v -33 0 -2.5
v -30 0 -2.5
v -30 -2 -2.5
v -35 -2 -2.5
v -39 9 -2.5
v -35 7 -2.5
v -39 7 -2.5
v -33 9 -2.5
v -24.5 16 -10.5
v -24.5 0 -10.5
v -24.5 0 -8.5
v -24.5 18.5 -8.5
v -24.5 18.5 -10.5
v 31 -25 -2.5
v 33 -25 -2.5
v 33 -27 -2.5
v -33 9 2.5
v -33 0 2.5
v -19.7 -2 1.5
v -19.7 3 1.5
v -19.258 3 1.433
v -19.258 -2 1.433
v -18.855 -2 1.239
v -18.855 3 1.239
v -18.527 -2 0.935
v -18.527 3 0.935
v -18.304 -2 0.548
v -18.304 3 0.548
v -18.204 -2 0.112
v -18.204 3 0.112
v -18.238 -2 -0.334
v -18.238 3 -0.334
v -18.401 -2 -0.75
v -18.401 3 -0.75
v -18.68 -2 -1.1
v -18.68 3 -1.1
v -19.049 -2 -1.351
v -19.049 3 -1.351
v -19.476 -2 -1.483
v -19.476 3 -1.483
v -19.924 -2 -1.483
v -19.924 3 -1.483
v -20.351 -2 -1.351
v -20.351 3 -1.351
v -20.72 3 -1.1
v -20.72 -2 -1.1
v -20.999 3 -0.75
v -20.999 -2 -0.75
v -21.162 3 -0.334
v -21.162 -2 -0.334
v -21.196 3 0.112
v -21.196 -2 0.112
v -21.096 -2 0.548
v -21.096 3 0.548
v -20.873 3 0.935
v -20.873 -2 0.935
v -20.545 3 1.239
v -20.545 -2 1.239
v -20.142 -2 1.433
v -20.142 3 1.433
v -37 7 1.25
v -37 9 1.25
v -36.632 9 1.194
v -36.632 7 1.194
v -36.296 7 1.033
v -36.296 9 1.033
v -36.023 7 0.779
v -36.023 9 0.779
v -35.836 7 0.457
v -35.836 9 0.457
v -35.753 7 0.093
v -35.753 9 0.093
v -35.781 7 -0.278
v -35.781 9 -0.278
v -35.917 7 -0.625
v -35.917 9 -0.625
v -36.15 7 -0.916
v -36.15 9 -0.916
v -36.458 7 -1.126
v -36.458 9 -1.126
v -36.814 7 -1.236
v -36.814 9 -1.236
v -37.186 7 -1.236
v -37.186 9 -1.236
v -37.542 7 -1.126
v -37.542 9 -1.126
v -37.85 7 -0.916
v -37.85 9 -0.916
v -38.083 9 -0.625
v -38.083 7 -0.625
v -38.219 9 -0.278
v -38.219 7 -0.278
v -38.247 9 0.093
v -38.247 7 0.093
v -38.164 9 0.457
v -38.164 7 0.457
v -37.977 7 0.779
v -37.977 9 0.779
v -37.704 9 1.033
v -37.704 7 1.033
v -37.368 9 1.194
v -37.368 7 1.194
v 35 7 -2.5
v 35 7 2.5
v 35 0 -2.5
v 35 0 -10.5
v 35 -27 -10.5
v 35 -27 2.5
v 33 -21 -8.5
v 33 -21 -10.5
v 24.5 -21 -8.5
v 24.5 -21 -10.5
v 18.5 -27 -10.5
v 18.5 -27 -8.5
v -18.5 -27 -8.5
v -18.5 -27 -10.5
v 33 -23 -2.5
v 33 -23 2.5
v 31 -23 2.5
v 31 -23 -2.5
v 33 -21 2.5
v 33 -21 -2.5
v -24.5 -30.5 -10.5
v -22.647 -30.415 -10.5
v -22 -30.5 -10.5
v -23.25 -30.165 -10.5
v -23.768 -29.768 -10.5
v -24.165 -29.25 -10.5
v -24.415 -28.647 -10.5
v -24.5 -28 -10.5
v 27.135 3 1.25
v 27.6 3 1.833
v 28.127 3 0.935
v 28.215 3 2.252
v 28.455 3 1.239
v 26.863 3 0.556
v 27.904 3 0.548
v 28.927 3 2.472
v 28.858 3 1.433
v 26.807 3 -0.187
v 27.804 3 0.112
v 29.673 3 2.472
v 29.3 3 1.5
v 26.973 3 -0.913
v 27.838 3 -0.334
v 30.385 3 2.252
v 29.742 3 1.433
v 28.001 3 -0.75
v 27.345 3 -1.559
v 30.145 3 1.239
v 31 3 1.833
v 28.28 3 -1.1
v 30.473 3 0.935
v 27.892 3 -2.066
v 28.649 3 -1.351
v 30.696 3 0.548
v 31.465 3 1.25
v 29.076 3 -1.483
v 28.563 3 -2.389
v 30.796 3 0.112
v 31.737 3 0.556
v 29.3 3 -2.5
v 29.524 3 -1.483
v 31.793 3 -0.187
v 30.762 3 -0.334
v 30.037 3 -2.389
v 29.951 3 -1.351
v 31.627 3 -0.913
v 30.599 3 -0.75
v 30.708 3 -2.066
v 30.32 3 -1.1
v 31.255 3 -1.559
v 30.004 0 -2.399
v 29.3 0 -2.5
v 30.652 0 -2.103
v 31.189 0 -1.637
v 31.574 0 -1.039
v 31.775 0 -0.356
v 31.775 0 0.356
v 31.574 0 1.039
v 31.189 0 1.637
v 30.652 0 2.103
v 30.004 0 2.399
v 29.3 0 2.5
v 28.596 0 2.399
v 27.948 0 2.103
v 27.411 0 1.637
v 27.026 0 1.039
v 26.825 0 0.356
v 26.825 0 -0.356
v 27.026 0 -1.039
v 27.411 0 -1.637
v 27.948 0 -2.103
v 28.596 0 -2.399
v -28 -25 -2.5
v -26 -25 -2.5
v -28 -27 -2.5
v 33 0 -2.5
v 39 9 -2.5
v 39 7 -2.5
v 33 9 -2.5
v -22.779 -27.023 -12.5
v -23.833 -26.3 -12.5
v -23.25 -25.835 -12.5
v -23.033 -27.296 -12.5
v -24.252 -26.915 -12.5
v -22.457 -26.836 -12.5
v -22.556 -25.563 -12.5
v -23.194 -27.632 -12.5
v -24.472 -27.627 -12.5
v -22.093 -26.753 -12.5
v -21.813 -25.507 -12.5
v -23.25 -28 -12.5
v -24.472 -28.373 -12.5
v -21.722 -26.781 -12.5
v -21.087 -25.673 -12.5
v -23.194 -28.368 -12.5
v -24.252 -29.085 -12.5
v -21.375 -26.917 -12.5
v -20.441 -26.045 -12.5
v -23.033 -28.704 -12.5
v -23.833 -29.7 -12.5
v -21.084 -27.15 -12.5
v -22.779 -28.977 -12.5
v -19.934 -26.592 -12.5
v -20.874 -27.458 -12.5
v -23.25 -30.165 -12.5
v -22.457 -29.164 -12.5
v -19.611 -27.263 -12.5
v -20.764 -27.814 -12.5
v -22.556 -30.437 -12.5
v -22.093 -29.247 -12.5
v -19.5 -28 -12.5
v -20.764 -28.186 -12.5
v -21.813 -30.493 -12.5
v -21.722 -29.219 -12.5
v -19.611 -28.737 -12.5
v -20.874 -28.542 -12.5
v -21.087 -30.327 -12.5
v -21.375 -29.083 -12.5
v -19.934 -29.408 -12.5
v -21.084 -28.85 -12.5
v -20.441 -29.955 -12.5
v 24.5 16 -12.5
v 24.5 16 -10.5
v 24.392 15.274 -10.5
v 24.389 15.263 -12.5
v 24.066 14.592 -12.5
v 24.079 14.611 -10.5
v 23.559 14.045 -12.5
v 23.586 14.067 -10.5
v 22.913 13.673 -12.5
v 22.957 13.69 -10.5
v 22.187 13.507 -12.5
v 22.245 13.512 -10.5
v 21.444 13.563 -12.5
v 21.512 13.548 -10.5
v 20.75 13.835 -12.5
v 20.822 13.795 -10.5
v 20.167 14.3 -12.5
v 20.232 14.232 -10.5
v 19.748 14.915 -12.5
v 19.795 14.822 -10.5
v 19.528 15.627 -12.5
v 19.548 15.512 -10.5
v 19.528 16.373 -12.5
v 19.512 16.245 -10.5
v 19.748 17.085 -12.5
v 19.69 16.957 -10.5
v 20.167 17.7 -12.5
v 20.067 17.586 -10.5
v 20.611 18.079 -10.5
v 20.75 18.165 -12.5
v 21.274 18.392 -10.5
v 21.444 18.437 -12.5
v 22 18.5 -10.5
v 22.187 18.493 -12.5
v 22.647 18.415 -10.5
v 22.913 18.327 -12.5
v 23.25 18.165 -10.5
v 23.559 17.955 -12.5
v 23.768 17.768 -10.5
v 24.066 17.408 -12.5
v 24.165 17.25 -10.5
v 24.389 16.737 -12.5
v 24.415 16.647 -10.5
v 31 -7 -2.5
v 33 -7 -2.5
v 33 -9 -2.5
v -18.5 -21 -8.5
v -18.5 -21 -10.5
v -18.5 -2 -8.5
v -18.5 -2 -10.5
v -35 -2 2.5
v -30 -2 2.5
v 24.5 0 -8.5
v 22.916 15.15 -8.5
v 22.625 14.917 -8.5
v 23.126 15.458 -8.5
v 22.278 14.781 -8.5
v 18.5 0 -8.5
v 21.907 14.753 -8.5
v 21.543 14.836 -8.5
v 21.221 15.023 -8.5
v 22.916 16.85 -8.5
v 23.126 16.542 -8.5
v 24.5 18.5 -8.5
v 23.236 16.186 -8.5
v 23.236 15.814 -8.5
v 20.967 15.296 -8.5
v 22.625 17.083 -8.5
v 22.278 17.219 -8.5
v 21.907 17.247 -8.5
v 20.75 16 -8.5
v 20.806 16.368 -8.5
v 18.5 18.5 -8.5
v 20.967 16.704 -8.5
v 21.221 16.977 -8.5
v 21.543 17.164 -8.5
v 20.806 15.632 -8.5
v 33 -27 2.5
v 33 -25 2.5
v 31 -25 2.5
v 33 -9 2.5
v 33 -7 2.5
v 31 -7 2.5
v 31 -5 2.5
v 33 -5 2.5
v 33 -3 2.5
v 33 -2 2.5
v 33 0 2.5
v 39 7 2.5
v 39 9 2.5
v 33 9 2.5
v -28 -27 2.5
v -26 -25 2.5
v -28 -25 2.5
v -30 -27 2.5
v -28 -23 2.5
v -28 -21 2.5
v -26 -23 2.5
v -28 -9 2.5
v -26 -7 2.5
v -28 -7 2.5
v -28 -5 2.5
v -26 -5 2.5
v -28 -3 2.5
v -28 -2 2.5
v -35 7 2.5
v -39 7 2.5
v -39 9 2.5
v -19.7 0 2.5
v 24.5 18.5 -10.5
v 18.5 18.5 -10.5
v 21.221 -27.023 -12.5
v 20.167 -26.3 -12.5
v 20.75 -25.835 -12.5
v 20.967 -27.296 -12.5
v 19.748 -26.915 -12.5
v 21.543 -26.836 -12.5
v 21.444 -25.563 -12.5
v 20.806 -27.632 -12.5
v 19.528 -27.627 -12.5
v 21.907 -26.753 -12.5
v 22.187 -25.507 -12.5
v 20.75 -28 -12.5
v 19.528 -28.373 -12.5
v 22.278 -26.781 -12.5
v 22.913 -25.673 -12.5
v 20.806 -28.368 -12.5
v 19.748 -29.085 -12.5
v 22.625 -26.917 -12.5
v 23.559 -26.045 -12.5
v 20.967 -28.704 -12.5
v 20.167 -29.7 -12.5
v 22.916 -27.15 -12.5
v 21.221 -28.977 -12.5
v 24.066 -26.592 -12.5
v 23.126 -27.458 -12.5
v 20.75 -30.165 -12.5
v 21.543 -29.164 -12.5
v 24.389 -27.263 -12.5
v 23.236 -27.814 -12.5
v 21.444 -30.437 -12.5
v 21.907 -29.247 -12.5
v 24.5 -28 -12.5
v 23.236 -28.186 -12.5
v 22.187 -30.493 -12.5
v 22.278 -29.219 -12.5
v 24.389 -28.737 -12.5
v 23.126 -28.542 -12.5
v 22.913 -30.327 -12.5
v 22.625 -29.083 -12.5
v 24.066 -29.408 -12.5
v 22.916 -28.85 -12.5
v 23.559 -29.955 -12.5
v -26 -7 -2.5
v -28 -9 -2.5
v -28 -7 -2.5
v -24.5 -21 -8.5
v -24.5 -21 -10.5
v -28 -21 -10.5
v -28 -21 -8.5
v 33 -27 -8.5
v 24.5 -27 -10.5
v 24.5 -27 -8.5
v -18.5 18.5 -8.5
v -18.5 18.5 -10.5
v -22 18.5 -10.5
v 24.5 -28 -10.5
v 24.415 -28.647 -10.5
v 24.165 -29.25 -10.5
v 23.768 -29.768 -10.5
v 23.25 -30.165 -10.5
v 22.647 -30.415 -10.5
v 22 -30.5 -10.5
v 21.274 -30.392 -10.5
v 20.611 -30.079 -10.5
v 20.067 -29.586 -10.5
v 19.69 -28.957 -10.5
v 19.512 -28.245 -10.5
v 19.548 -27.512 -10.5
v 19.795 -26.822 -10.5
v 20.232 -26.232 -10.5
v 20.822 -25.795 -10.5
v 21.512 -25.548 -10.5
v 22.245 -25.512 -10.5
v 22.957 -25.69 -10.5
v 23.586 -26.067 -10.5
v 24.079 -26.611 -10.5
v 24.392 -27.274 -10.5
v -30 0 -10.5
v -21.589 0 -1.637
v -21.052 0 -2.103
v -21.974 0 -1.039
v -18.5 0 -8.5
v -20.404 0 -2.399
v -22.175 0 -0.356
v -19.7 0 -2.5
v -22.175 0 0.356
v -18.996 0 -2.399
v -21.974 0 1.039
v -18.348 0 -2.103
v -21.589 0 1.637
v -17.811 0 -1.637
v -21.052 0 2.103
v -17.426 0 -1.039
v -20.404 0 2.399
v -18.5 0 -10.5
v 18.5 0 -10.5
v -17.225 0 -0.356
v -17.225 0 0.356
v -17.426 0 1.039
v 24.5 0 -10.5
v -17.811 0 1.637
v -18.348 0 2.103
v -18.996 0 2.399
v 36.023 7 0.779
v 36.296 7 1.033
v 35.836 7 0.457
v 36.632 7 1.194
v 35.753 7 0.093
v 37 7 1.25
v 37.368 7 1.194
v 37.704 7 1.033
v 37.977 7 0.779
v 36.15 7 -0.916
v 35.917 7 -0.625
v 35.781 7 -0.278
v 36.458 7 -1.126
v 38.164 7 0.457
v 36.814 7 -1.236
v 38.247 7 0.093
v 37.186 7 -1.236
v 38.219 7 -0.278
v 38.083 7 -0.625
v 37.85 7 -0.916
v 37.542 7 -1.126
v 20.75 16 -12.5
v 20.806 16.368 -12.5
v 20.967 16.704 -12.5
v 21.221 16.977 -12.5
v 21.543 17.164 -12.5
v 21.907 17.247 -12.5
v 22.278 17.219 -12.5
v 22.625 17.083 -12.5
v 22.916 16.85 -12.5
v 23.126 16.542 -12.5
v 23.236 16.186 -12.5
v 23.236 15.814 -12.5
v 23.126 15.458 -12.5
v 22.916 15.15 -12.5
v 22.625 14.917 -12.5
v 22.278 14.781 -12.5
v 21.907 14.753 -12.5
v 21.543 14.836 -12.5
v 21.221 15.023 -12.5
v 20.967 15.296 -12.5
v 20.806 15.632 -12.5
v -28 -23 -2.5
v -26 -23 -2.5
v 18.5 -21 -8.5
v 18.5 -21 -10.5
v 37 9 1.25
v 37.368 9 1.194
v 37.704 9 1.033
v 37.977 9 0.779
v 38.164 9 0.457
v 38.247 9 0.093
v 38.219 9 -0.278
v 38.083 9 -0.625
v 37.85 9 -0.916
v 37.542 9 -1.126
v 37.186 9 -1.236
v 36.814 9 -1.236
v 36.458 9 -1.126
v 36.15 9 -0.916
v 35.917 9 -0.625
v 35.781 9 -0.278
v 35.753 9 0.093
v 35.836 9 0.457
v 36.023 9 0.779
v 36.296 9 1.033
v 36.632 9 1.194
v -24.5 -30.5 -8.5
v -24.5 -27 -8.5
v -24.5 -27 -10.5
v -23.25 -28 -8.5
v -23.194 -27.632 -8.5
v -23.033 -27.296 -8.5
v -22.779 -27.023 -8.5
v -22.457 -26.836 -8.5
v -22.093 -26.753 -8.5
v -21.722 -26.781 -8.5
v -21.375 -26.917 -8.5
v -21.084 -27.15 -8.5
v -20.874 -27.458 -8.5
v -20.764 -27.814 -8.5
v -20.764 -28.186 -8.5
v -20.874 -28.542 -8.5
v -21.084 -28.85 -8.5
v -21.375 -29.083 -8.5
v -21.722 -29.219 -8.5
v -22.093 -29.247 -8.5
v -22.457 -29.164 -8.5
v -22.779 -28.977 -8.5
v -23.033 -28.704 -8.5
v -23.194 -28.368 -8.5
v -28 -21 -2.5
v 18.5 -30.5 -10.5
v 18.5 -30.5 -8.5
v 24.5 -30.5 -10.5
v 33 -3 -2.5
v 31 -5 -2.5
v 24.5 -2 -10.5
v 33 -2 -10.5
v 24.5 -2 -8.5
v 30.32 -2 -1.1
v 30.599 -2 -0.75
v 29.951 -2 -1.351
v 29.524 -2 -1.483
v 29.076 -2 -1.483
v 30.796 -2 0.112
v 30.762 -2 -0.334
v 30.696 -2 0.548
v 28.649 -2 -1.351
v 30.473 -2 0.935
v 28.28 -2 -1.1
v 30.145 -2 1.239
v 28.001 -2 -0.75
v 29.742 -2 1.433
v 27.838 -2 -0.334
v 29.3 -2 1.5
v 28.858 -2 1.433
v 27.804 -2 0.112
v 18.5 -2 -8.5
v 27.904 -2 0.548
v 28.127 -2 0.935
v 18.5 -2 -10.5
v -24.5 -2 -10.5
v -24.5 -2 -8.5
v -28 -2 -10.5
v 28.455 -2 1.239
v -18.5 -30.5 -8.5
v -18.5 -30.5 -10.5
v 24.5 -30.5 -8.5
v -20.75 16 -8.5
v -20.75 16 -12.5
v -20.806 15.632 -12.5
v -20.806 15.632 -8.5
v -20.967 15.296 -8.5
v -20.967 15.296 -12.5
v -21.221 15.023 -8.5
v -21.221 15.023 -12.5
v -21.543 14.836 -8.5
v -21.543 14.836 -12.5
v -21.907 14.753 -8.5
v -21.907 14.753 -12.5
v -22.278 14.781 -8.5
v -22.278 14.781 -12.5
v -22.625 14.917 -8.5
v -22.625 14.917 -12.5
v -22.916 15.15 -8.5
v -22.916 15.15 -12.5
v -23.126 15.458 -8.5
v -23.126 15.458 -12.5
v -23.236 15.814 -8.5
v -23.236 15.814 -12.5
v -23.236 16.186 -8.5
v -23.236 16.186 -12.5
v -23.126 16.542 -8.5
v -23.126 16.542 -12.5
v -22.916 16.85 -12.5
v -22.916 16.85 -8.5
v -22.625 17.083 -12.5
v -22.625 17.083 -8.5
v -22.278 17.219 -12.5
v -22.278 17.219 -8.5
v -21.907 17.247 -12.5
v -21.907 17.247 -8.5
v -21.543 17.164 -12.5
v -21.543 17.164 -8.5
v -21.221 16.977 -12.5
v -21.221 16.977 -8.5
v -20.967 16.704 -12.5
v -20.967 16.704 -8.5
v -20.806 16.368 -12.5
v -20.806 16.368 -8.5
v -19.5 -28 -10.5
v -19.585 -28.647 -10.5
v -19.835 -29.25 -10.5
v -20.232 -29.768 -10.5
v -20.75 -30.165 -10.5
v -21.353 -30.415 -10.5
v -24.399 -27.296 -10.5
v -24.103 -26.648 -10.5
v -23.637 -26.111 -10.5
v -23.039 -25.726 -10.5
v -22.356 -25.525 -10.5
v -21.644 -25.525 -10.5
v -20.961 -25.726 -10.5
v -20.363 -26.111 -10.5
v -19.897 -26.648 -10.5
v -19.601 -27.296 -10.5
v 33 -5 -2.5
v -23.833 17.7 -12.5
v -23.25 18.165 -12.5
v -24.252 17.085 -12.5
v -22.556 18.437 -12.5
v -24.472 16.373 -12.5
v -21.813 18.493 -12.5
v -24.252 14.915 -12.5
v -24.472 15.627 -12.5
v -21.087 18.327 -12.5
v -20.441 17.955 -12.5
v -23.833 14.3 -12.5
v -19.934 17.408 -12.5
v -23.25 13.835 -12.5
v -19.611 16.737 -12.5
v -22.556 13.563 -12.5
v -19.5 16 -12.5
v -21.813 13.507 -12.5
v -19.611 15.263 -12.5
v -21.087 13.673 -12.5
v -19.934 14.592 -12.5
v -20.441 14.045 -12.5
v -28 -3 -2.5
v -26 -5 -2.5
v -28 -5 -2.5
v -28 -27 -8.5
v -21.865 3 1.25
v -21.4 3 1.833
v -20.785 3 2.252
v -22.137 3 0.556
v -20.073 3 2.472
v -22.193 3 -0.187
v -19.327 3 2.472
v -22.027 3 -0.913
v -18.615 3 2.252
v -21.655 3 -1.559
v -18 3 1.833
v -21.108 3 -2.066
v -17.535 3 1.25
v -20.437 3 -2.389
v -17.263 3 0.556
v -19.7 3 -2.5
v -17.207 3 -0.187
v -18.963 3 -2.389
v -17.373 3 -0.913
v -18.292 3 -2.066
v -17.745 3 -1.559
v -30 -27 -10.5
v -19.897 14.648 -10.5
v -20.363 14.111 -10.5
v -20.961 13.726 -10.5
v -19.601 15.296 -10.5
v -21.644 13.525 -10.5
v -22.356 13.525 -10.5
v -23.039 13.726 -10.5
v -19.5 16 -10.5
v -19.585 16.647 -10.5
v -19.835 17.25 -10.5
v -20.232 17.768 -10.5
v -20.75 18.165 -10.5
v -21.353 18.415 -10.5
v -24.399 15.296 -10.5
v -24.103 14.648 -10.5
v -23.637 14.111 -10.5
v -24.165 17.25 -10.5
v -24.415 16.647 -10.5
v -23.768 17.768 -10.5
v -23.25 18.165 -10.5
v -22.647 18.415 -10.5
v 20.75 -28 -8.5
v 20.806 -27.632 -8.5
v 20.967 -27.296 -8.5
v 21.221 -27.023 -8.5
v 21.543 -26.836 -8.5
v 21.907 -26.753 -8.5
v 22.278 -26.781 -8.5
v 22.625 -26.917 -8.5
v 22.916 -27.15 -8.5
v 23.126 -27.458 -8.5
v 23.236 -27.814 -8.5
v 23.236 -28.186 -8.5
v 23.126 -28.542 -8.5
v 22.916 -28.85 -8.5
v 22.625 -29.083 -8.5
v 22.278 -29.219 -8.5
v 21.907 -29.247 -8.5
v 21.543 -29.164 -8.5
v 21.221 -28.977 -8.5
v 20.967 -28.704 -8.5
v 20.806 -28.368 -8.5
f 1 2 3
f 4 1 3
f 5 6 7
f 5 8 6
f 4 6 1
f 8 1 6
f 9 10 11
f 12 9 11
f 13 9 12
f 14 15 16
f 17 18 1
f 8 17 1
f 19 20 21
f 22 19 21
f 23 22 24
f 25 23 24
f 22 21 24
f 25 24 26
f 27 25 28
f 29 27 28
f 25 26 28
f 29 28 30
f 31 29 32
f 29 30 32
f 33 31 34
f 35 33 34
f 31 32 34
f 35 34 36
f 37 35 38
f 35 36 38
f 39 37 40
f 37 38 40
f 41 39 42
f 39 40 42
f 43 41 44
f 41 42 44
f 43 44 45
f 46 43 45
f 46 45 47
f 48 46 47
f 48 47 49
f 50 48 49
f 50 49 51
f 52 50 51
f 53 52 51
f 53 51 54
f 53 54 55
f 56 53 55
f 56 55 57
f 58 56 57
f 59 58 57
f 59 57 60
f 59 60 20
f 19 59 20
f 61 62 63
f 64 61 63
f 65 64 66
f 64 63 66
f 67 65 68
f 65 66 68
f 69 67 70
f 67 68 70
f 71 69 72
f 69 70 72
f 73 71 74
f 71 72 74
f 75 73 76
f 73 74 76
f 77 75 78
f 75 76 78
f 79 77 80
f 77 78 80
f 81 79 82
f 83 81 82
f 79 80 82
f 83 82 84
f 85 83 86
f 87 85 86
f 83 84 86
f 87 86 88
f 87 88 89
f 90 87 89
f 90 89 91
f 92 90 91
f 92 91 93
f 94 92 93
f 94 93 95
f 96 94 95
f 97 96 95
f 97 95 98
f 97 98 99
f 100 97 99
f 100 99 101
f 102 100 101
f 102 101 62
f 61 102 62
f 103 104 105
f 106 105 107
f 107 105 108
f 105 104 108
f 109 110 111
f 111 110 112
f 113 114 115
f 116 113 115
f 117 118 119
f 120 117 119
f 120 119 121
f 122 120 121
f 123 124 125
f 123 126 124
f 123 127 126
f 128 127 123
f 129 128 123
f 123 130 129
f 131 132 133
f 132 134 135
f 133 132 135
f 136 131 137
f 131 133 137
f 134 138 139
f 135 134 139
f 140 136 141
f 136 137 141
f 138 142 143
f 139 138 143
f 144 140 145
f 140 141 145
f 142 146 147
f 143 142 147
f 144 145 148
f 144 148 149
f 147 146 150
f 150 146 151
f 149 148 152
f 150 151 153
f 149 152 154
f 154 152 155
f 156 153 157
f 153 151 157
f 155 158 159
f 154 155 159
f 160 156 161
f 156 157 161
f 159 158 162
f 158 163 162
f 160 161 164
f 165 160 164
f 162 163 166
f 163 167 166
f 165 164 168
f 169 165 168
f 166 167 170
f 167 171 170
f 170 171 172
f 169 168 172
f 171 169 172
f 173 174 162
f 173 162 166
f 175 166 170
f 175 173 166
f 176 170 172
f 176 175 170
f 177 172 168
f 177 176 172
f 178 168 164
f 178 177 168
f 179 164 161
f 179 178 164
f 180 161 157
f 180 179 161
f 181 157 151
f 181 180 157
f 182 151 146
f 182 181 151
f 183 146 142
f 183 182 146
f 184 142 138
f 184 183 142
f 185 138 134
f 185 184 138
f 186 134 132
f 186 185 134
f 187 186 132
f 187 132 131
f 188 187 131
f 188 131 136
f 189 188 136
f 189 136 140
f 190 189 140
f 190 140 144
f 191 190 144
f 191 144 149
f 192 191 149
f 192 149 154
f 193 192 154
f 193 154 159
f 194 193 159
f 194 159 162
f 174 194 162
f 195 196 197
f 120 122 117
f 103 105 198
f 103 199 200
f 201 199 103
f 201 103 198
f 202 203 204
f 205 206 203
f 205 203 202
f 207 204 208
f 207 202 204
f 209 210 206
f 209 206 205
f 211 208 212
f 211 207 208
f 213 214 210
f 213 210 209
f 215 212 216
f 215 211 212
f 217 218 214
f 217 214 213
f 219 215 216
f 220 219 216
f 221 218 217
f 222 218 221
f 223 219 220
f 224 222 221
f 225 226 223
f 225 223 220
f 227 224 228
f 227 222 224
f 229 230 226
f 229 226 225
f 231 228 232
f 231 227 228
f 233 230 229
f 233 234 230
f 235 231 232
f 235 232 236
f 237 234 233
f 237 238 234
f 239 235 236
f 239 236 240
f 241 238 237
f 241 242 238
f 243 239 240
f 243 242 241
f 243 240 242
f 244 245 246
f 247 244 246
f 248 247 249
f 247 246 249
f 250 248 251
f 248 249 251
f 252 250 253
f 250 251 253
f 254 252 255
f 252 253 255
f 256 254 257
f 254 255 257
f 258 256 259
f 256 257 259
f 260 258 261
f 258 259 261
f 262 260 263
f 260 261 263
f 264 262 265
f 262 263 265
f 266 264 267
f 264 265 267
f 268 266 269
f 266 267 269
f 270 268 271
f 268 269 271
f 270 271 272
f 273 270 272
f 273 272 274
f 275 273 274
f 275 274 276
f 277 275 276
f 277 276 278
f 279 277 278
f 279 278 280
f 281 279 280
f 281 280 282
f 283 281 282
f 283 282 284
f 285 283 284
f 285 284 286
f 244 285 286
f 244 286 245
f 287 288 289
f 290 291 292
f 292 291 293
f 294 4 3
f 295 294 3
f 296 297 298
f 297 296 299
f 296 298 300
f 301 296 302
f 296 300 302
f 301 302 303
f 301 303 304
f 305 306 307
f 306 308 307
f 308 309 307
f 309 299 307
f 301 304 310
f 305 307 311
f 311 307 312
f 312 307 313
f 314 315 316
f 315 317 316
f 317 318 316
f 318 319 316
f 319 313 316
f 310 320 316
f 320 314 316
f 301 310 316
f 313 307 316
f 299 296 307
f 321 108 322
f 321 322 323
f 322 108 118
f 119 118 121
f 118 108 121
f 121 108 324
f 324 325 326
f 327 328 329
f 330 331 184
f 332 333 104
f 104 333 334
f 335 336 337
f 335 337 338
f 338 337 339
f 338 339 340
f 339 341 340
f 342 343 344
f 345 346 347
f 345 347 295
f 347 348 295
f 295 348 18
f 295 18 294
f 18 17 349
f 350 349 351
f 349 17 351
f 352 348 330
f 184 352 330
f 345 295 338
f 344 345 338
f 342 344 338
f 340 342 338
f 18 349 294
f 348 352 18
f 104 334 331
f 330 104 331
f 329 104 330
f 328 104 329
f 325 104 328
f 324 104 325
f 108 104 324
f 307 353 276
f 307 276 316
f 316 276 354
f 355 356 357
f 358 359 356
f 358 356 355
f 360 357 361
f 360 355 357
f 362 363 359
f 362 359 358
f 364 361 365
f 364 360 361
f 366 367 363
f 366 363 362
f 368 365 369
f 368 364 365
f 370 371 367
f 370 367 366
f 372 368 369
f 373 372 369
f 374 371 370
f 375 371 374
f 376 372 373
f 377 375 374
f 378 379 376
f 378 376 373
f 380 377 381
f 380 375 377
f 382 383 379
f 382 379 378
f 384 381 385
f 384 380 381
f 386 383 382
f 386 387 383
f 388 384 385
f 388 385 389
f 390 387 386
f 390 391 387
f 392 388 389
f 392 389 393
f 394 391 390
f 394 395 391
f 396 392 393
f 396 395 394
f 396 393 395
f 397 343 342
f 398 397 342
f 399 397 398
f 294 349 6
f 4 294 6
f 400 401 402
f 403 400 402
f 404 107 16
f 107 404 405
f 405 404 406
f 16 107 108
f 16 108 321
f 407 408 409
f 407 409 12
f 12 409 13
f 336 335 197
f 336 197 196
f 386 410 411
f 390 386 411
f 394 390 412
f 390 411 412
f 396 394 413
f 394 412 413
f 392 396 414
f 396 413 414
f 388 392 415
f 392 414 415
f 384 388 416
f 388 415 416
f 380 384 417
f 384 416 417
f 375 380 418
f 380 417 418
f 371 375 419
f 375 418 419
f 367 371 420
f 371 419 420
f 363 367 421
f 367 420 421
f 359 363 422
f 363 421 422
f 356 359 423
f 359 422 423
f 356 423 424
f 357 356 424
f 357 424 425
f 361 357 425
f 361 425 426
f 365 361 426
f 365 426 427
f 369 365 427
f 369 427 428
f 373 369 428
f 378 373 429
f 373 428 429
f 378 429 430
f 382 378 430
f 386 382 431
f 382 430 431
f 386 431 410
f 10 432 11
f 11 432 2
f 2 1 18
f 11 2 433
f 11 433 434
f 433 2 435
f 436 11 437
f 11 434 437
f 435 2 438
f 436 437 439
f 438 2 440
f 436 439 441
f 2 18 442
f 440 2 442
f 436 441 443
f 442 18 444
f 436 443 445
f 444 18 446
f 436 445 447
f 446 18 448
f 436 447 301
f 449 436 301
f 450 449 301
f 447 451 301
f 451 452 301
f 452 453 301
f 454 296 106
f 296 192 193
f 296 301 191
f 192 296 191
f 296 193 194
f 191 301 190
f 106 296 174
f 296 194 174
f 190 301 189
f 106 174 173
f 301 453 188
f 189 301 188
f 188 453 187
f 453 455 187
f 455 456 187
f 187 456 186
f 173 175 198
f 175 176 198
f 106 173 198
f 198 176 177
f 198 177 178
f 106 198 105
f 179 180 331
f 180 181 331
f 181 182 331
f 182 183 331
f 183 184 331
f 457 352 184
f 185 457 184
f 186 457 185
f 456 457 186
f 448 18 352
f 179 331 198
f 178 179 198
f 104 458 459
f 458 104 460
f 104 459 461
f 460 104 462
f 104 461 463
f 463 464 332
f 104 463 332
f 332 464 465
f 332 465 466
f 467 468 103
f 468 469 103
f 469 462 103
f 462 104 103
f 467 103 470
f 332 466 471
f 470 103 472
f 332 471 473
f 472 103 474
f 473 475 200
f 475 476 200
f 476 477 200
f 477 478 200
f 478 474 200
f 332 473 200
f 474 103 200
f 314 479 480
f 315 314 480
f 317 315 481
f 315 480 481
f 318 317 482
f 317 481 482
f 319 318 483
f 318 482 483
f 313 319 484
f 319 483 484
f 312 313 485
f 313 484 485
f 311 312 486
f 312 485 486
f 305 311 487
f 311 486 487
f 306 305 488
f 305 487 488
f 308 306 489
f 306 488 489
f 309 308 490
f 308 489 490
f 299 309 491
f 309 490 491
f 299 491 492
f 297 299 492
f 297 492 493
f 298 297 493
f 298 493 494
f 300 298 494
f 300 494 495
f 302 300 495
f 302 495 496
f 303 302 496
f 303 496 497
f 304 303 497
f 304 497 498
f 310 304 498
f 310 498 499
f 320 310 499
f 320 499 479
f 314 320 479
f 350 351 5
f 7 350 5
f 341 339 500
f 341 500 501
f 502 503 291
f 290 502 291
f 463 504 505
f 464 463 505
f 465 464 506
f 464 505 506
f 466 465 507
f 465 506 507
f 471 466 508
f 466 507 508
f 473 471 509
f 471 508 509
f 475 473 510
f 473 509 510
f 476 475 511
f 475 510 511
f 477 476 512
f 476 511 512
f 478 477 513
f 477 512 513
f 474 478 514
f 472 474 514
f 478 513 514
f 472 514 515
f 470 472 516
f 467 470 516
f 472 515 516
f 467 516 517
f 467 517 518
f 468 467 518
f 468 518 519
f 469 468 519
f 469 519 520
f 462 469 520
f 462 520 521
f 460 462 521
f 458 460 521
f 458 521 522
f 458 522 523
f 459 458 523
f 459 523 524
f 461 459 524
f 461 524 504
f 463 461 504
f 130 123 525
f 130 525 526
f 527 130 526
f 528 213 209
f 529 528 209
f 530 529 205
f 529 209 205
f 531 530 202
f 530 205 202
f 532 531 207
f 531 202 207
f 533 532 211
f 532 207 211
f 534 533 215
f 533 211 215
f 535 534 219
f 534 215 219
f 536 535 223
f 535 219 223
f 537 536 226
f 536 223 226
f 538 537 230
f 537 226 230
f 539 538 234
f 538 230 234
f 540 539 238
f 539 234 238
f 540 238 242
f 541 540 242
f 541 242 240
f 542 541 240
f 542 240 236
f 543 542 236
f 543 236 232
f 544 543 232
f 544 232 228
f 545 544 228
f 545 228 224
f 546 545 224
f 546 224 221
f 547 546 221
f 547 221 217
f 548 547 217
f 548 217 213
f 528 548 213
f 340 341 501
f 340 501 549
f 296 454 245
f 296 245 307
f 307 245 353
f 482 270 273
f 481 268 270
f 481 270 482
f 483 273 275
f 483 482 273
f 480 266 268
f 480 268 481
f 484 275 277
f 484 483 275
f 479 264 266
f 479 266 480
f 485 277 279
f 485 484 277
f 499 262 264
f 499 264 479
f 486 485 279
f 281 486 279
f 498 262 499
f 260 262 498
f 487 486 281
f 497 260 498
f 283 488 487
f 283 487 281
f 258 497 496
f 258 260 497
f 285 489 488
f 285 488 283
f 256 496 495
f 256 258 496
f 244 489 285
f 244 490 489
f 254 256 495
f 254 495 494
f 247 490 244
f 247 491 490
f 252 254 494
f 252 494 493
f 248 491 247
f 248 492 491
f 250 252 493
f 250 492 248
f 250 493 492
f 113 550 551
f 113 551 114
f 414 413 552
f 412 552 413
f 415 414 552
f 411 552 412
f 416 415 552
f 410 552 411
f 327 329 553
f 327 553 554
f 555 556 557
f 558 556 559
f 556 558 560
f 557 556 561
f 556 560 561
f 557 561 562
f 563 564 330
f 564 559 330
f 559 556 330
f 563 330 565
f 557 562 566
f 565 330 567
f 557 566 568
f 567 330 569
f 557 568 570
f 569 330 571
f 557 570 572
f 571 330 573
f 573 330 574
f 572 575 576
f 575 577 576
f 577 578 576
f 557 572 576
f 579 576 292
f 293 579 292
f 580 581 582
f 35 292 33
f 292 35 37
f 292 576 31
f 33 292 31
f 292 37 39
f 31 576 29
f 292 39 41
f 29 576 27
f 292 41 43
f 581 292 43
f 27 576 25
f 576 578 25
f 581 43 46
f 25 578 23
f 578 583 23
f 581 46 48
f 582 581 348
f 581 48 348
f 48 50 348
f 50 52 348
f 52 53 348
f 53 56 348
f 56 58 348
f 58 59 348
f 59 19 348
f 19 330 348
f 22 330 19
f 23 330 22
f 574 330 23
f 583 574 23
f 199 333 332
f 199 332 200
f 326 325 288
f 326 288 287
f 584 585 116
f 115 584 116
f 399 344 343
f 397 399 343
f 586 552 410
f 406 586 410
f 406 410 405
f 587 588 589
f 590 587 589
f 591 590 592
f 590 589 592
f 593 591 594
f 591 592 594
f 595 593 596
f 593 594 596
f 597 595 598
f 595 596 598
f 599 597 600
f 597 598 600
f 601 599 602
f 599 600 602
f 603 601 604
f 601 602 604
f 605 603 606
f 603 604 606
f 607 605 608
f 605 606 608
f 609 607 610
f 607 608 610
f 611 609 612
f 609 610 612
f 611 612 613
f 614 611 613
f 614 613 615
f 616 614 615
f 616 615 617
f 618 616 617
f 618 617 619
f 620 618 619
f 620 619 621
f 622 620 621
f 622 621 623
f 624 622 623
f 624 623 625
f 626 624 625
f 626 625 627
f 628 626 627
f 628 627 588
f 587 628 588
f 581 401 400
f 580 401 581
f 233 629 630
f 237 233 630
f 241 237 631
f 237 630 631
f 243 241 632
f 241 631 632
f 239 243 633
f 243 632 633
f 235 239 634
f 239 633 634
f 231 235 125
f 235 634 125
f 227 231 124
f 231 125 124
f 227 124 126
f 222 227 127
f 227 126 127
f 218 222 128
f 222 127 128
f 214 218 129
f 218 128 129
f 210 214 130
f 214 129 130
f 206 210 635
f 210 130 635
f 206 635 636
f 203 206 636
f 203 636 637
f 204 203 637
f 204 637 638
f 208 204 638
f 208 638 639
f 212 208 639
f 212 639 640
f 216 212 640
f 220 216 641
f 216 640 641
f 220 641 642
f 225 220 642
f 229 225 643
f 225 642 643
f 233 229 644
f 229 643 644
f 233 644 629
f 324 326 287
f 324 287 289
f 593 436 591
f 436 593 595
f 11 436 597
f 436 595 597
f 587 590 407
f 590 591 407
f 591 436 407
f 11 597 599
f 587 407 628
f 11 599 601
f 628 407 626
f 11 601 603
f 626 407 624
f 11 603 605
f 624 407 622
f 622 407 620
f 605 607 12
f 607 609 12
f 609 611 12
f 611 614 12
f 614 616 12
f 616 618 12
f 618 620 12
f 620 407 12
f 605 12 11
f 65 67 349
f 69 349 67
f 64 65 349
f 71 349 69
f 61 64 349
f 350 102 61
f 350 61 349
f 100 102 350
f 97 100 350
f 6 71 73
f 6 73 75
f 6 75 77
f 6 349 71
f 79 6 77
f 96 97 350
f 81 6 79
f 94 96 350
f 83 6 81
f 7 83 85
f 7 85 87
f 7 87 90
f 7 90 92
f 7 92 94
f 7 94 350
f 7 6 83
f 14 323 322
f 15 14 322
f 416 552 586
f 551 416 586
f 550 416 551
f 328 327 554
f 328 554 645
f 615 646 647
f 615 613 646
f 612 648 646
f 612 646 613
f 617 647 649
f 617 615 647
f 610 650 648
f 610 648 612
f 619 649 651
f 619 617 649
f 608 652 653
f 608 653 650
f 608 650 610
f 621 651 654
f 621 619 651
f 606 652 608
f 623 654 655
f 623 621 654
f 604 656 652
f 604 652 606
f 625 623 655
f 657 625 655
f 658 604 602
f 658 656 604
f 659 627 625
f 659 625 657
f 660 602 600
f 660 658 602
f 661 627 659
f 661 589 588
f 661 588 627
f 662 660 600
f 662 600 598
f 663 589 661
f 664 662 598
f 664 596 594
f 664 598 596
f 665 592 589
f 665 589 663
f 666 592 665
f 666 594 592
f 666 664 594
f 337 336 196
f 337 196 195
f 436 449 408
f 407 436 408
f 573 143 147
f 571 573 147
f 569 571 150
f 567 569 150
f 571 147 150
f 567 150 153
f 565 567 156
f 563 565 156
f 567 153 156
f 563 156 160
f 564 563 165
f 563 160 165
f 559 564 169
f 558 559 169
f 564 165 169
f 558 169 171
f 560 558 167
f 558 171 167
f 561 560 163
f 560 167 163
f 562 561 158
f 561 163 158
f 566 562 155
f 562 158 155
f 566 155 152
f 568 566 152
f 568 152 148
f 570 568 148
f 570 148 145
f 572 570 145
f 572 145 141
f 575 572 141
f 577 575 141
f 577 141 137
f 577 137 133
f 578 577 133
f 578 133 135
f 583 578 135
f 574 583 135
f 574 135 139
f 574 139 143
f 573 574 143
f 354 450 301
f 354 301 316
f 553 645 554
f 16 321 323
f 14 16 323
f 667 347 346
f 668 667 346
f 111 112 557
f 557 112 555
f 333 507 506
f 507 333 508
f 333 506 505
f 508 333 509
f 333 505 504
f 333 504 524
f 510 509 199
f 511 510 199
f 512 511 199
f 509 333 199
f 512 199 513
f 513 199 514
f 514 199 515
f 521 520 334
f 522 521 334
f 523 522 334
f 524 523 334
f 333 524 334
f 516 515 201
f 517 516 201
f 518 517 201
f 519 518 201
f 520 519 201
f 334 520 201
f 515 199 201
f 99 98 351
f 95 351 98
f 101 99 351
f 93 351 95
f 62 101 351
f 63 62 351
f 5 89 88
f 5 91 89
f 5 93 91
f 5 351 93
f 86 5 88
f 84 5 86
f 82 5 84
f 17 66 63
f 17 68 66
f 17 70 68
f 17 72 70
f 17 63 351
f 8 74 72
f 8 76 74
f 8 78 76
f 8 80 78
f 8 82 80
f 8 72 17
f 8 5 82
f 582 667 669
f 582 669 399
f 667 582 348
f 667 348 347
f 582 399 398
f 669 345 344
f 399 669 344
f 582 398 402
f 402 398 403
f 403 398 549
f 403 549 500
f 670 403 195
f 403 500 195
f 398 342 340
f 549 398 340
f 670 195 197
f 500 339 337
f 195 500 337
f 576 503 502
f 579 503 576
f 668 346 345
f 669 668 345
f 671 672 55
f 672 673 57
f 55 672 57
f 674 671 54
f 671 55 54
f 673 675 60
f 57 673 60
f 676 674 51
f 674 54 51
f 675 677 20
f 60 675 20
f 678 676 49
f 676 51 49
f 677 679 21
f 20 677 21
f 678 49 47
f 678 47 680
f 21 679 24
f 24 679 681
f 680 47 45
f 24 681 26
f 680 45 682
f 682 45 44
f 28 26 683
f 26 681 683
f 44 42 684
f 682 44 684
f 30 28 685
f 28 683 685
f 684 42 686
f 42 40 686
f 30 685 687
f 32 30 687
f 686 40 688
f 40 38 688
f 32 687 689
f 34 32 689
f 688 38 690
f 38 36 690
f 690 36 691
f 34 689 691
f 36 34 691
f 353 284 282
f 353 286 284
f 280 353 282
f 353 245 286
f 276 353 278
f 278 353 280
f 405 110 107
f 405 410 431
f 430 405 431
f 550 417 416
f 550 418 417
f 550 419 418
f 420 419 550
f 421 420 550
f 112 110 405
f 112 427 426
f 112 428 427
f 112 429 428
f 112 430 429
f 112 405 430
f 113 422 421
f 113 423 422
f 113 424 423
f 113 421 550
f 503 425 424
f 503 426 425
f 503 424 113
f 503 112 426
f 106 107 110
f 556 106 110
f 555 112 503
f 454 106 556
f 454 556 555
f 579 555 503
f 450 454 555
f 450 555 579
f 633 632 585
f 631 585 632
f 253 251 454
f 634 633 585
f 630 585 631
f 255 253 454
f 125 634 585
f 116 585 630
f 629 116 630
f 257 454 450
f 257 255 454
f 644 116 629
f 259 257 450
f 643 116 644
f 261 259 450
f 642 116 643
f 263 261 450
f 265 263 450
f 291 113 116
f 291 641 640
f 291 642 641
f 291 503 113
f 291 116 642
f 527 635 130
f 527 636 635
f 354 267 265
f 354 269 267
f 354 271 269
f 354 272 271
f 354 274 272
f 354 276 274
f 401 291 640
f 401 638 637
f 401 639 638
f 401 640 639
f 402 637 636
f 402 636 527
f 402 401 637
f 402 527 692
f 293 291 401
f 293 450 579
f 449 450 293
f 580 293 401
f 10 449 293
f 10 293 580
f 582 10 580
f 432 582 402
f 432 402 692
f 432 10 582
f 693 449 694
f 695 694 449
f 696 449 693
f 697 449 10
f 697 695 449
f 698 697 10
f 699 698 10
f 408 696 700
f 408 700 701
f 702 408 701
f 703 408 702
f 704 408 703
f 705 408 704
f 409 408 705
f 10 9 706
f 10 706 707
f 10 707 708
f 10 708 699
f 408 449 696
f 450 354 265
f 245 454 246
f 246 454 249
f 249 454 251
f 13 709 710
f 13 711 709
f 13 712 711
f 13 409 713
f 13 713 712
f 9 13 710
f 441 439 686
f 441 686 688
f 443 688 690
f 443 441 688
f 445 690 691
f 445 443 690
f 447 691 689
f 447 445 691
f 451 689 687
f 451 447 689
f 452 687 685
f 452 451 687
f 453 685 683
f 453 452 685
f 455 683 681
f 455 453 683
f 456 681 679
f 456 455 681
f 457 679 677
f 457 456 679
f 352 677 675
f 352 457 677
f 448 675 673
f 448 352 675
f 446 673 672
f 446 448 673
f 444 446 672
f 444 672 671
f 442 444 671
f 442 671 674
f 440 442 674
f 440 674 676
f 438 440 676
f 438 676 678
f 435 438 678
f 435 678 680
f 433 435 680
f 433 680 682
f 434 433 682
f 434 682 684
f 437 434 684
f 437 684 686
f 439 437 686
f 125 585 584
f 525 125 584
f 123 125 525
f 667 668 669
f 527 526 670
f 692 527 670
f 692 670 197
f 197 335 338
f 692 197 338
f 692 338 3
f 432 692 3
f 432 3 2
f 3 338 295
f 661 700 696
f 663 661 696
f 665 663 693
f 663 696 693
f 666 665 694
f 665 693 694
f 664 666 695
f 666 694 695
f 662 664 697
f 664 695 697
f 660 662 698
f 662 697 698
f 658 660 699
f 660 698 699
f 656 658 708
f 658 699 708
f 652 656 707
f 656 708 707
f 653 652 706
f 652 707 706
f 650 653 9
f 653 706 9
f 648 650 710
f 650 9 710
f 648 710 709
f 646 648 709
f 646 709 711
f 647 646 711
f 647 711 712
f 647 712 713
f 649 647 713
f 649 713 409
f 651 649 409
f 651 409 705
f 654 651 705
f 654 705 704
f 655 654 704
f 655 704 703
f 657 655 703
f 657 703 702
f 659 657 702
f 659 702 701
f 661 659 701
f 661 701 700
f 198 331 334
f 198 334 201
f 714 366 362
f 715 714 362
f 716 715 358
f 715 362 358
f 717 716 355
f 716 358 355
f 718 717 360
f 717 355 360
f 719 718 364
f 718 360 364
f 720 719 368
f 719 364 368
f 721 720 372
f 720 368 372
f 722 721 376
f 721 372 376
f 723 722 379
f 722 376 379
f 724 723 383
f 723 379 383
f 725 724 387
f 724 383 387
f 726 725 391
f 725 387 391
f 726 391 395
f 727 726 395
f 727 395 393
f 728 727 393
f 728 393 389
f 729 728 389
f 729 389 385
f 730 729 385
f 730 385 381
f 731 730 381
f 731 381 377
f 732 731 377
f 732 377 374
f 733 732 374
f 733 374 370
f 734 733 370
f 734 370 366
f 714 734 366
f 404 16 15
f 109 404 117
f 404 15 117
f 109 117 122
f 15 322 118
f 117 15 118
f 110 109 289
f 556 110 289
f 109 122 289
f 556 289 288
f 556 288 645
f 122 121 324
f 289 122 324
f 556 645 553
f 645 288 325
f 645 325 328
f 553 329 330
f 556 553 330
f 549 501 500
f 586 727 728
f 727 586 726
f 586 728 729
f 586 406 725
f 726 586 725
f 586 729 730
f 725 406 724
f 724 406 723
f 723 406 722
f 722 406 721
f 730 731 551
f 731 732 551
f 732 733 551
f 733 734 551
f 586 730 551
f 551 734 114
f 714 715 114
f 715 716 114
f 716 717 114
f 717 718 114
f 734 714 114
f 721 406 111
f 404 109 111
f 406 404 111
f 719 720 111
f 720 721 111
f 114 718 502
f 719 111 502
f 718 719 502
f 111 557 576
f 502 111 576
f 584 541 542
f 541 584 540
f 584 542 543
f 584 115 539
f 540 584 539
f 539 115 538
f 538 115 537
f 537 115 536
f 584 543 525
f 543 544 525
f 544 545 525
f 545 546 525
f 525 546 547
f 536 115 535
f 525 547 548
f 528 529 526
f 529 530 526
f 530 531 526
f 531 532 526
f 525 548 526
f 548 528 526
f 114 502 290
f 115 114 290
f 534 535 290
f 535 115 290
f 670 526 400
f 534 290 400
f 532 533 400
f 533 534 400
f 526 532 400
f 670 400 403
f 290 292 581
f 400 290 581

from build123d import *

# Parameters (mm, degrees)
SKETCH1_W           = 66
SKETCH1_H           = 5
BASE_FLANGE1_DEPTH  = 2
SKETCH2_R           = 2.5
BOSS_EXTRUDE1_DEPTH = 3
SKETCH3_W           = 2
SKETCH3_H           = 5
BOSS_EXTRUDE2_DEPTH = 11
SKETCH4_W           = 6
SKETCH4_H           = 5
BOSS_EXTRUDE3_DEPTH = 2
SKETCH5_R           = 1.5
CUT_EXTRUDE1_DEPTH  = 40.537956447
SKETCH6_R           = 1.25
CUT_EXTRUDE2_DEPTH  = 41.598645298
SKETCH7_W           = 2
SKETCH7_H           = 5
BOSS_EXTRUDE4_DEPTH = 25
BOSS_EXTRUDE5_DEPTH = 5
BOSS_EXTRUDE6_DEPTH = 8
SKETCH13_W          = 65
SKETCH13_H          = 6
BOSS_EXTRUDE8_DEPTH = 2
SKETCH12_W          = 6
SKETCH12_H          = 49
BOSS_EXTRUDE7_DEPTH = 2
SKETCH14_R          = 2.5
BOSS_EXTRUDE9_DEPTH = 2
CUT_EXTRUDE3_REACH  = 53.732
SKETCH15_R          = 1.25


# Sheet-metal steps are written as plain solids
with BuildPart() as part:
    # Sketch1 → Base-Flange1 (new body)
    with BuildSketch(Plane(origin=(0, 0, 0), x_dir=(1, 0, 0), z_dir=(0, 1, 0))):
        Rectangle(SKETCH1_W, SKETCH1_H)
    extrude(amount=-BASE_FLANGE1_DEPTH)

    # Sketch2 → Boss-Extrude1 (add)
    with BuildSketch(Plane(origin=(0, 0, 0), x_dir=(-1, 0, 0), z_dir=(0, -1, 0))):
        with Locations(Location((19.7, 0, 0), (0, 0, 90))):
            Circle(SKETCH2_R)
        with Locations(Location((-29.3, 0, 0), (0, 0, 90))):
            Circle(SKETCH2_R)
    extrude(amount=-BOSS_EXTRUDE1_DEPTH)

    # Sketch3 → Boss-Extrude2 (add)
    with BuildSketch(Plane(origin=(0, -2, 0), x_dir=(-1, 0, 0), z_dir=(0, -1, 0))):
        with Locations((-34, 0)):
            Rectangle(SKETCH3_W, SKETCH3_H)
    boss_extrude2 = extrude(amount=-BOSS_EXTRUDE2_DEPTH)

    # Sketch4 → Boss-Extrude3 (add)
    with BuildSketch(Plane(origin=(0, 9, 0), x_dir=(1, 0, 0), z_dir=(0, 1, 0))):
        with Locations((36, 0)):
            Rectangle(SKETCH4_W, SKETCH4_H)
    boss_extrude3 = extrude(amount=-BOSS_EXTRUDE3_DEPTH)

    # Mirror1: Boss-Extrude2, Boss-Extrude3 across plane
    add(boss_extrude2.mirror(Plane(origin=(0, 0, 0), x_dir=(0, 0, 1), z_dir=(1, 0, 0))))
    add(boss_extrude3.mirror(Plane(origin=(0, 0, 0), x_dir=(0, 0, 1), z_dir=(1, 0, 0))))

    # Sketch5 → Cut-Extrude1 (cut, through all)
    with BuildSketch(Plane(origin=(0, 3, 0), x_dir=(1, 0, 0), z_dir=(0, 1, 0))):
        with Locations(Location((-19.7, 0, 0), (0, 0, 270))):
            Circle(SKETCH5_R)
        with Locations(Location((29.3, 0, 0), (0, 0, 270))):
            Circle(SKETCH5_R)
    extrude(amount=-CUT_EXTRUDE1_DEPTH, mode=Mode.SUBTRACT)

    # Sketch6 → Cut-Extrude2 (cut, through all)
    with BuildSketch(Plane(origin=(0, 9, 0), x_dir=(1, 0, 0), z_dir=(0, 1, 0))):
        with Locations(Location((-37, 0, 0), (0, 0, 270))):
            Circle(SKETCH6_R)
        with Locations(Location((37, 0, 0), (0, 0, 270))):
            Circle(SKETCH6_R)
    extrude(amount=-CUT_EXTRUDE2_DEPTH, mode=Mode.SUBTRACT)

    # Sketch7 → Boss-Extrude4 (add)
    with BuildSketch(Plane(origin=(0, -2, 0), x_dir=(-1, 0, 0), z_dir=(0, -1, 0))):
        with Locations((29, 0)):
            Rectangle(SKETCH7_W, SKETCH7_H)
    boss_extrude4 = extrude(amount=BOSS_EXTRUDE4_DEPTH)

    # Sketch8 → Boss-Extrude5 (add)
    with BuildSketch(Plane.XY.offset(2.5)):
        Polygon((-28, -3), (-26, -5), (-28, -5), align=None)
        Polygon((-28, -7), (-26, -7), (-28, -9), align=None)
        Polygon((-28, -21), (-28, -23), (-26, -23), align=None)
        Polygon((-28, -25), (-28, -27), (-26, -25), align=None)
    boss_extrude5 = extrude(amount=-BOSS_EXTRUDE5_DEPTH)

    # Mirror2: Boss-Extrude4, Boss-Extrude5 across plane
    add(boss_extrude4.mirror(Plane(origin=(2.5, 0, 0), x_dir=(0, 0, 1), z_dir=(1, 0, 0))))
    add(boss_extrude5.mirror(Plane(origin=(2.5, 0, 0), x_dir=(0, 0, 1), z_dir=(1, 0, 0))))

    # Sketch11 → Boss-Extrude6 (add)
    with BuildSketch(Plane.XY.offset(-2.5)):
        Polygon((-30, -27), (-30, 0), (35, 0), (35, -27), (33, -27), (33, -2), (-28, -2), (-28, -27), align=None)
    extrude(amount=-BOSS_EXTRUDE6_DEPTH)

    # Sketch13 → Boss-Extrude8 (add)
    with BuildSketch(Plane(origin=(0, 0, -10.5), x_dir=(-1, 0, 0), z_dir=(0, 0, -1))):
        with Locations((-2.5, -24)):
            Rectangle(SKETCH13_W, SKETCH13_H)
    extrude(amount=-BOSS_EXTRUDE8_DEPTH)

    # Sketch12 → Boss-Extrude7 (add)
    with BuildSketch(Plane(origin=(0, 0, -10.5), x_dir=(-1, 0, 0), z_dir=(0, 0, -1))):
        with Locations((-21.5, -6)):
            Rectangle(SKETCH12_W, SKETCH12_H)
        with Locations((21.5, -6)):
            Rectangle(SKETCH12_W, SKETCH12_H)
    extrude(amount=-BOSS_EXTRUDE7_DEPTH)

    # Sketch14 → Boss-Extrude9 (add)
    with BuildSketch(Plane(origin=(0, 0, -10.5), x_dir=(-1, 0, 0), z_dir=(0, 0, -1))):
        with Locations(Location((-22, 16, 0), (0, 0, 180))):
            Circle(SKETCH14_R)
        with Locations(Location((22, 16, 0), (0, 0, 180))):
            Circle(SKETCH14_R)
        with Locations(Location((-22, -28, 0), (0, 0, 180))):
            Circle(SKETCH14_R)
        with Locations(Location((22, -28, 0), (0, 0, 180))):
            Circle(SKETCH14_R)
    extrude(amount=BOSS_EXTRUDE9_DEPTH)

    # Sketch15 → Cut-Extrude3 (cut, up to next)
    with BuildSketch(Plane(origin=(0, 0, -12.5), x_dir=(-1, 0, 0), z_dir=(0, 0, -1)), mode=Mode.PRIVATE) as cut_extrude3_sk1:
        with Locations((-22, 16)):
            Circle(SKETCH15_R)
    cut_extrude3_tool1 = extrude(cut_extrude3_sk1.sketch, amount=-CUT_EXTRUDE3_REACH, mode=Mode.PRIVATE) & part.part
    # Sketch15 → Cut-Extrude3 (cut, up to next)
    with BuildSketch(Plane(origin=(0, 0, -12.5), x_dir=(-1, 0, 0), z_dir=(0, 0, -1)), mode=Mode.PRIVATE) as cut_extrude3_sk2:
        with Locations(Location((22, 16, 0), (0, 0, 180))):
            Circle(SKETCH15_R)
    cut_extrude3_tool2 = extrude(cut_extrude3_sk2.sketch, amount=-CUT_EXTRUDE3_REACH, mode=Mode.PRIVATE) & part.part
    # Sketch15 → Cut-Extrude3 (cut, up to next)
    with BuildSketch(Plane(origin=(0, 0, -12.5), x_dir=(-1, 0, 0), z_dir=(0, 0, -1)), mode=Mode.PRIVATE) as cut_extrude3_sk3:
        with Locations((22, -28)):
            Circle(SKETCH15_R)
    cut_extrude3_tool3 = extrude(cut_extrude3_sk3.sketch, amount=-CUT_EXTRUDE3_REACH, mode=Mode.PRIVATE) & part.part
    # Sketch15 → Cut-Extrude3 (cut, up to next)
    with BuildSketch(Plane(origin=(0, 0, -12.5), x_dir=(-1, 0, 0), z_dir=(0, 0, -1)), mode=Mode.PRIVATE) as cut_extrude3_sk4:
        with Locations((-22, -28)):
            Circle(SKETCH15_R)
    cut_extrude3_tool4 = extrude(cut_extrude3_sk4.sketch, amount=-CUT_EXTRUDE3_REACH, mode=Mode.PRIVATE) & part.part
    add(cut_extrude3_tool1.solids().sort_by_distance((22, 16, -12.5))[0], mode=Mode.SUBTRACT)
    add(cut_extrude3_tool2.solids().sort_by_distance((-22, 16, -12.5))[0], mode=Mode.SUBTRACT)
    add(cut_extrude3_tool3.solids().sort_by_distance((-22, -28, -12.5))[0], mode=Mode.SUBTRACT)
    add(cut_extrude3_tool4.solids().sort_by_distance((22, -28, -12.5))[0], mode=Mode.SUBTRACT)


solid = part.part
